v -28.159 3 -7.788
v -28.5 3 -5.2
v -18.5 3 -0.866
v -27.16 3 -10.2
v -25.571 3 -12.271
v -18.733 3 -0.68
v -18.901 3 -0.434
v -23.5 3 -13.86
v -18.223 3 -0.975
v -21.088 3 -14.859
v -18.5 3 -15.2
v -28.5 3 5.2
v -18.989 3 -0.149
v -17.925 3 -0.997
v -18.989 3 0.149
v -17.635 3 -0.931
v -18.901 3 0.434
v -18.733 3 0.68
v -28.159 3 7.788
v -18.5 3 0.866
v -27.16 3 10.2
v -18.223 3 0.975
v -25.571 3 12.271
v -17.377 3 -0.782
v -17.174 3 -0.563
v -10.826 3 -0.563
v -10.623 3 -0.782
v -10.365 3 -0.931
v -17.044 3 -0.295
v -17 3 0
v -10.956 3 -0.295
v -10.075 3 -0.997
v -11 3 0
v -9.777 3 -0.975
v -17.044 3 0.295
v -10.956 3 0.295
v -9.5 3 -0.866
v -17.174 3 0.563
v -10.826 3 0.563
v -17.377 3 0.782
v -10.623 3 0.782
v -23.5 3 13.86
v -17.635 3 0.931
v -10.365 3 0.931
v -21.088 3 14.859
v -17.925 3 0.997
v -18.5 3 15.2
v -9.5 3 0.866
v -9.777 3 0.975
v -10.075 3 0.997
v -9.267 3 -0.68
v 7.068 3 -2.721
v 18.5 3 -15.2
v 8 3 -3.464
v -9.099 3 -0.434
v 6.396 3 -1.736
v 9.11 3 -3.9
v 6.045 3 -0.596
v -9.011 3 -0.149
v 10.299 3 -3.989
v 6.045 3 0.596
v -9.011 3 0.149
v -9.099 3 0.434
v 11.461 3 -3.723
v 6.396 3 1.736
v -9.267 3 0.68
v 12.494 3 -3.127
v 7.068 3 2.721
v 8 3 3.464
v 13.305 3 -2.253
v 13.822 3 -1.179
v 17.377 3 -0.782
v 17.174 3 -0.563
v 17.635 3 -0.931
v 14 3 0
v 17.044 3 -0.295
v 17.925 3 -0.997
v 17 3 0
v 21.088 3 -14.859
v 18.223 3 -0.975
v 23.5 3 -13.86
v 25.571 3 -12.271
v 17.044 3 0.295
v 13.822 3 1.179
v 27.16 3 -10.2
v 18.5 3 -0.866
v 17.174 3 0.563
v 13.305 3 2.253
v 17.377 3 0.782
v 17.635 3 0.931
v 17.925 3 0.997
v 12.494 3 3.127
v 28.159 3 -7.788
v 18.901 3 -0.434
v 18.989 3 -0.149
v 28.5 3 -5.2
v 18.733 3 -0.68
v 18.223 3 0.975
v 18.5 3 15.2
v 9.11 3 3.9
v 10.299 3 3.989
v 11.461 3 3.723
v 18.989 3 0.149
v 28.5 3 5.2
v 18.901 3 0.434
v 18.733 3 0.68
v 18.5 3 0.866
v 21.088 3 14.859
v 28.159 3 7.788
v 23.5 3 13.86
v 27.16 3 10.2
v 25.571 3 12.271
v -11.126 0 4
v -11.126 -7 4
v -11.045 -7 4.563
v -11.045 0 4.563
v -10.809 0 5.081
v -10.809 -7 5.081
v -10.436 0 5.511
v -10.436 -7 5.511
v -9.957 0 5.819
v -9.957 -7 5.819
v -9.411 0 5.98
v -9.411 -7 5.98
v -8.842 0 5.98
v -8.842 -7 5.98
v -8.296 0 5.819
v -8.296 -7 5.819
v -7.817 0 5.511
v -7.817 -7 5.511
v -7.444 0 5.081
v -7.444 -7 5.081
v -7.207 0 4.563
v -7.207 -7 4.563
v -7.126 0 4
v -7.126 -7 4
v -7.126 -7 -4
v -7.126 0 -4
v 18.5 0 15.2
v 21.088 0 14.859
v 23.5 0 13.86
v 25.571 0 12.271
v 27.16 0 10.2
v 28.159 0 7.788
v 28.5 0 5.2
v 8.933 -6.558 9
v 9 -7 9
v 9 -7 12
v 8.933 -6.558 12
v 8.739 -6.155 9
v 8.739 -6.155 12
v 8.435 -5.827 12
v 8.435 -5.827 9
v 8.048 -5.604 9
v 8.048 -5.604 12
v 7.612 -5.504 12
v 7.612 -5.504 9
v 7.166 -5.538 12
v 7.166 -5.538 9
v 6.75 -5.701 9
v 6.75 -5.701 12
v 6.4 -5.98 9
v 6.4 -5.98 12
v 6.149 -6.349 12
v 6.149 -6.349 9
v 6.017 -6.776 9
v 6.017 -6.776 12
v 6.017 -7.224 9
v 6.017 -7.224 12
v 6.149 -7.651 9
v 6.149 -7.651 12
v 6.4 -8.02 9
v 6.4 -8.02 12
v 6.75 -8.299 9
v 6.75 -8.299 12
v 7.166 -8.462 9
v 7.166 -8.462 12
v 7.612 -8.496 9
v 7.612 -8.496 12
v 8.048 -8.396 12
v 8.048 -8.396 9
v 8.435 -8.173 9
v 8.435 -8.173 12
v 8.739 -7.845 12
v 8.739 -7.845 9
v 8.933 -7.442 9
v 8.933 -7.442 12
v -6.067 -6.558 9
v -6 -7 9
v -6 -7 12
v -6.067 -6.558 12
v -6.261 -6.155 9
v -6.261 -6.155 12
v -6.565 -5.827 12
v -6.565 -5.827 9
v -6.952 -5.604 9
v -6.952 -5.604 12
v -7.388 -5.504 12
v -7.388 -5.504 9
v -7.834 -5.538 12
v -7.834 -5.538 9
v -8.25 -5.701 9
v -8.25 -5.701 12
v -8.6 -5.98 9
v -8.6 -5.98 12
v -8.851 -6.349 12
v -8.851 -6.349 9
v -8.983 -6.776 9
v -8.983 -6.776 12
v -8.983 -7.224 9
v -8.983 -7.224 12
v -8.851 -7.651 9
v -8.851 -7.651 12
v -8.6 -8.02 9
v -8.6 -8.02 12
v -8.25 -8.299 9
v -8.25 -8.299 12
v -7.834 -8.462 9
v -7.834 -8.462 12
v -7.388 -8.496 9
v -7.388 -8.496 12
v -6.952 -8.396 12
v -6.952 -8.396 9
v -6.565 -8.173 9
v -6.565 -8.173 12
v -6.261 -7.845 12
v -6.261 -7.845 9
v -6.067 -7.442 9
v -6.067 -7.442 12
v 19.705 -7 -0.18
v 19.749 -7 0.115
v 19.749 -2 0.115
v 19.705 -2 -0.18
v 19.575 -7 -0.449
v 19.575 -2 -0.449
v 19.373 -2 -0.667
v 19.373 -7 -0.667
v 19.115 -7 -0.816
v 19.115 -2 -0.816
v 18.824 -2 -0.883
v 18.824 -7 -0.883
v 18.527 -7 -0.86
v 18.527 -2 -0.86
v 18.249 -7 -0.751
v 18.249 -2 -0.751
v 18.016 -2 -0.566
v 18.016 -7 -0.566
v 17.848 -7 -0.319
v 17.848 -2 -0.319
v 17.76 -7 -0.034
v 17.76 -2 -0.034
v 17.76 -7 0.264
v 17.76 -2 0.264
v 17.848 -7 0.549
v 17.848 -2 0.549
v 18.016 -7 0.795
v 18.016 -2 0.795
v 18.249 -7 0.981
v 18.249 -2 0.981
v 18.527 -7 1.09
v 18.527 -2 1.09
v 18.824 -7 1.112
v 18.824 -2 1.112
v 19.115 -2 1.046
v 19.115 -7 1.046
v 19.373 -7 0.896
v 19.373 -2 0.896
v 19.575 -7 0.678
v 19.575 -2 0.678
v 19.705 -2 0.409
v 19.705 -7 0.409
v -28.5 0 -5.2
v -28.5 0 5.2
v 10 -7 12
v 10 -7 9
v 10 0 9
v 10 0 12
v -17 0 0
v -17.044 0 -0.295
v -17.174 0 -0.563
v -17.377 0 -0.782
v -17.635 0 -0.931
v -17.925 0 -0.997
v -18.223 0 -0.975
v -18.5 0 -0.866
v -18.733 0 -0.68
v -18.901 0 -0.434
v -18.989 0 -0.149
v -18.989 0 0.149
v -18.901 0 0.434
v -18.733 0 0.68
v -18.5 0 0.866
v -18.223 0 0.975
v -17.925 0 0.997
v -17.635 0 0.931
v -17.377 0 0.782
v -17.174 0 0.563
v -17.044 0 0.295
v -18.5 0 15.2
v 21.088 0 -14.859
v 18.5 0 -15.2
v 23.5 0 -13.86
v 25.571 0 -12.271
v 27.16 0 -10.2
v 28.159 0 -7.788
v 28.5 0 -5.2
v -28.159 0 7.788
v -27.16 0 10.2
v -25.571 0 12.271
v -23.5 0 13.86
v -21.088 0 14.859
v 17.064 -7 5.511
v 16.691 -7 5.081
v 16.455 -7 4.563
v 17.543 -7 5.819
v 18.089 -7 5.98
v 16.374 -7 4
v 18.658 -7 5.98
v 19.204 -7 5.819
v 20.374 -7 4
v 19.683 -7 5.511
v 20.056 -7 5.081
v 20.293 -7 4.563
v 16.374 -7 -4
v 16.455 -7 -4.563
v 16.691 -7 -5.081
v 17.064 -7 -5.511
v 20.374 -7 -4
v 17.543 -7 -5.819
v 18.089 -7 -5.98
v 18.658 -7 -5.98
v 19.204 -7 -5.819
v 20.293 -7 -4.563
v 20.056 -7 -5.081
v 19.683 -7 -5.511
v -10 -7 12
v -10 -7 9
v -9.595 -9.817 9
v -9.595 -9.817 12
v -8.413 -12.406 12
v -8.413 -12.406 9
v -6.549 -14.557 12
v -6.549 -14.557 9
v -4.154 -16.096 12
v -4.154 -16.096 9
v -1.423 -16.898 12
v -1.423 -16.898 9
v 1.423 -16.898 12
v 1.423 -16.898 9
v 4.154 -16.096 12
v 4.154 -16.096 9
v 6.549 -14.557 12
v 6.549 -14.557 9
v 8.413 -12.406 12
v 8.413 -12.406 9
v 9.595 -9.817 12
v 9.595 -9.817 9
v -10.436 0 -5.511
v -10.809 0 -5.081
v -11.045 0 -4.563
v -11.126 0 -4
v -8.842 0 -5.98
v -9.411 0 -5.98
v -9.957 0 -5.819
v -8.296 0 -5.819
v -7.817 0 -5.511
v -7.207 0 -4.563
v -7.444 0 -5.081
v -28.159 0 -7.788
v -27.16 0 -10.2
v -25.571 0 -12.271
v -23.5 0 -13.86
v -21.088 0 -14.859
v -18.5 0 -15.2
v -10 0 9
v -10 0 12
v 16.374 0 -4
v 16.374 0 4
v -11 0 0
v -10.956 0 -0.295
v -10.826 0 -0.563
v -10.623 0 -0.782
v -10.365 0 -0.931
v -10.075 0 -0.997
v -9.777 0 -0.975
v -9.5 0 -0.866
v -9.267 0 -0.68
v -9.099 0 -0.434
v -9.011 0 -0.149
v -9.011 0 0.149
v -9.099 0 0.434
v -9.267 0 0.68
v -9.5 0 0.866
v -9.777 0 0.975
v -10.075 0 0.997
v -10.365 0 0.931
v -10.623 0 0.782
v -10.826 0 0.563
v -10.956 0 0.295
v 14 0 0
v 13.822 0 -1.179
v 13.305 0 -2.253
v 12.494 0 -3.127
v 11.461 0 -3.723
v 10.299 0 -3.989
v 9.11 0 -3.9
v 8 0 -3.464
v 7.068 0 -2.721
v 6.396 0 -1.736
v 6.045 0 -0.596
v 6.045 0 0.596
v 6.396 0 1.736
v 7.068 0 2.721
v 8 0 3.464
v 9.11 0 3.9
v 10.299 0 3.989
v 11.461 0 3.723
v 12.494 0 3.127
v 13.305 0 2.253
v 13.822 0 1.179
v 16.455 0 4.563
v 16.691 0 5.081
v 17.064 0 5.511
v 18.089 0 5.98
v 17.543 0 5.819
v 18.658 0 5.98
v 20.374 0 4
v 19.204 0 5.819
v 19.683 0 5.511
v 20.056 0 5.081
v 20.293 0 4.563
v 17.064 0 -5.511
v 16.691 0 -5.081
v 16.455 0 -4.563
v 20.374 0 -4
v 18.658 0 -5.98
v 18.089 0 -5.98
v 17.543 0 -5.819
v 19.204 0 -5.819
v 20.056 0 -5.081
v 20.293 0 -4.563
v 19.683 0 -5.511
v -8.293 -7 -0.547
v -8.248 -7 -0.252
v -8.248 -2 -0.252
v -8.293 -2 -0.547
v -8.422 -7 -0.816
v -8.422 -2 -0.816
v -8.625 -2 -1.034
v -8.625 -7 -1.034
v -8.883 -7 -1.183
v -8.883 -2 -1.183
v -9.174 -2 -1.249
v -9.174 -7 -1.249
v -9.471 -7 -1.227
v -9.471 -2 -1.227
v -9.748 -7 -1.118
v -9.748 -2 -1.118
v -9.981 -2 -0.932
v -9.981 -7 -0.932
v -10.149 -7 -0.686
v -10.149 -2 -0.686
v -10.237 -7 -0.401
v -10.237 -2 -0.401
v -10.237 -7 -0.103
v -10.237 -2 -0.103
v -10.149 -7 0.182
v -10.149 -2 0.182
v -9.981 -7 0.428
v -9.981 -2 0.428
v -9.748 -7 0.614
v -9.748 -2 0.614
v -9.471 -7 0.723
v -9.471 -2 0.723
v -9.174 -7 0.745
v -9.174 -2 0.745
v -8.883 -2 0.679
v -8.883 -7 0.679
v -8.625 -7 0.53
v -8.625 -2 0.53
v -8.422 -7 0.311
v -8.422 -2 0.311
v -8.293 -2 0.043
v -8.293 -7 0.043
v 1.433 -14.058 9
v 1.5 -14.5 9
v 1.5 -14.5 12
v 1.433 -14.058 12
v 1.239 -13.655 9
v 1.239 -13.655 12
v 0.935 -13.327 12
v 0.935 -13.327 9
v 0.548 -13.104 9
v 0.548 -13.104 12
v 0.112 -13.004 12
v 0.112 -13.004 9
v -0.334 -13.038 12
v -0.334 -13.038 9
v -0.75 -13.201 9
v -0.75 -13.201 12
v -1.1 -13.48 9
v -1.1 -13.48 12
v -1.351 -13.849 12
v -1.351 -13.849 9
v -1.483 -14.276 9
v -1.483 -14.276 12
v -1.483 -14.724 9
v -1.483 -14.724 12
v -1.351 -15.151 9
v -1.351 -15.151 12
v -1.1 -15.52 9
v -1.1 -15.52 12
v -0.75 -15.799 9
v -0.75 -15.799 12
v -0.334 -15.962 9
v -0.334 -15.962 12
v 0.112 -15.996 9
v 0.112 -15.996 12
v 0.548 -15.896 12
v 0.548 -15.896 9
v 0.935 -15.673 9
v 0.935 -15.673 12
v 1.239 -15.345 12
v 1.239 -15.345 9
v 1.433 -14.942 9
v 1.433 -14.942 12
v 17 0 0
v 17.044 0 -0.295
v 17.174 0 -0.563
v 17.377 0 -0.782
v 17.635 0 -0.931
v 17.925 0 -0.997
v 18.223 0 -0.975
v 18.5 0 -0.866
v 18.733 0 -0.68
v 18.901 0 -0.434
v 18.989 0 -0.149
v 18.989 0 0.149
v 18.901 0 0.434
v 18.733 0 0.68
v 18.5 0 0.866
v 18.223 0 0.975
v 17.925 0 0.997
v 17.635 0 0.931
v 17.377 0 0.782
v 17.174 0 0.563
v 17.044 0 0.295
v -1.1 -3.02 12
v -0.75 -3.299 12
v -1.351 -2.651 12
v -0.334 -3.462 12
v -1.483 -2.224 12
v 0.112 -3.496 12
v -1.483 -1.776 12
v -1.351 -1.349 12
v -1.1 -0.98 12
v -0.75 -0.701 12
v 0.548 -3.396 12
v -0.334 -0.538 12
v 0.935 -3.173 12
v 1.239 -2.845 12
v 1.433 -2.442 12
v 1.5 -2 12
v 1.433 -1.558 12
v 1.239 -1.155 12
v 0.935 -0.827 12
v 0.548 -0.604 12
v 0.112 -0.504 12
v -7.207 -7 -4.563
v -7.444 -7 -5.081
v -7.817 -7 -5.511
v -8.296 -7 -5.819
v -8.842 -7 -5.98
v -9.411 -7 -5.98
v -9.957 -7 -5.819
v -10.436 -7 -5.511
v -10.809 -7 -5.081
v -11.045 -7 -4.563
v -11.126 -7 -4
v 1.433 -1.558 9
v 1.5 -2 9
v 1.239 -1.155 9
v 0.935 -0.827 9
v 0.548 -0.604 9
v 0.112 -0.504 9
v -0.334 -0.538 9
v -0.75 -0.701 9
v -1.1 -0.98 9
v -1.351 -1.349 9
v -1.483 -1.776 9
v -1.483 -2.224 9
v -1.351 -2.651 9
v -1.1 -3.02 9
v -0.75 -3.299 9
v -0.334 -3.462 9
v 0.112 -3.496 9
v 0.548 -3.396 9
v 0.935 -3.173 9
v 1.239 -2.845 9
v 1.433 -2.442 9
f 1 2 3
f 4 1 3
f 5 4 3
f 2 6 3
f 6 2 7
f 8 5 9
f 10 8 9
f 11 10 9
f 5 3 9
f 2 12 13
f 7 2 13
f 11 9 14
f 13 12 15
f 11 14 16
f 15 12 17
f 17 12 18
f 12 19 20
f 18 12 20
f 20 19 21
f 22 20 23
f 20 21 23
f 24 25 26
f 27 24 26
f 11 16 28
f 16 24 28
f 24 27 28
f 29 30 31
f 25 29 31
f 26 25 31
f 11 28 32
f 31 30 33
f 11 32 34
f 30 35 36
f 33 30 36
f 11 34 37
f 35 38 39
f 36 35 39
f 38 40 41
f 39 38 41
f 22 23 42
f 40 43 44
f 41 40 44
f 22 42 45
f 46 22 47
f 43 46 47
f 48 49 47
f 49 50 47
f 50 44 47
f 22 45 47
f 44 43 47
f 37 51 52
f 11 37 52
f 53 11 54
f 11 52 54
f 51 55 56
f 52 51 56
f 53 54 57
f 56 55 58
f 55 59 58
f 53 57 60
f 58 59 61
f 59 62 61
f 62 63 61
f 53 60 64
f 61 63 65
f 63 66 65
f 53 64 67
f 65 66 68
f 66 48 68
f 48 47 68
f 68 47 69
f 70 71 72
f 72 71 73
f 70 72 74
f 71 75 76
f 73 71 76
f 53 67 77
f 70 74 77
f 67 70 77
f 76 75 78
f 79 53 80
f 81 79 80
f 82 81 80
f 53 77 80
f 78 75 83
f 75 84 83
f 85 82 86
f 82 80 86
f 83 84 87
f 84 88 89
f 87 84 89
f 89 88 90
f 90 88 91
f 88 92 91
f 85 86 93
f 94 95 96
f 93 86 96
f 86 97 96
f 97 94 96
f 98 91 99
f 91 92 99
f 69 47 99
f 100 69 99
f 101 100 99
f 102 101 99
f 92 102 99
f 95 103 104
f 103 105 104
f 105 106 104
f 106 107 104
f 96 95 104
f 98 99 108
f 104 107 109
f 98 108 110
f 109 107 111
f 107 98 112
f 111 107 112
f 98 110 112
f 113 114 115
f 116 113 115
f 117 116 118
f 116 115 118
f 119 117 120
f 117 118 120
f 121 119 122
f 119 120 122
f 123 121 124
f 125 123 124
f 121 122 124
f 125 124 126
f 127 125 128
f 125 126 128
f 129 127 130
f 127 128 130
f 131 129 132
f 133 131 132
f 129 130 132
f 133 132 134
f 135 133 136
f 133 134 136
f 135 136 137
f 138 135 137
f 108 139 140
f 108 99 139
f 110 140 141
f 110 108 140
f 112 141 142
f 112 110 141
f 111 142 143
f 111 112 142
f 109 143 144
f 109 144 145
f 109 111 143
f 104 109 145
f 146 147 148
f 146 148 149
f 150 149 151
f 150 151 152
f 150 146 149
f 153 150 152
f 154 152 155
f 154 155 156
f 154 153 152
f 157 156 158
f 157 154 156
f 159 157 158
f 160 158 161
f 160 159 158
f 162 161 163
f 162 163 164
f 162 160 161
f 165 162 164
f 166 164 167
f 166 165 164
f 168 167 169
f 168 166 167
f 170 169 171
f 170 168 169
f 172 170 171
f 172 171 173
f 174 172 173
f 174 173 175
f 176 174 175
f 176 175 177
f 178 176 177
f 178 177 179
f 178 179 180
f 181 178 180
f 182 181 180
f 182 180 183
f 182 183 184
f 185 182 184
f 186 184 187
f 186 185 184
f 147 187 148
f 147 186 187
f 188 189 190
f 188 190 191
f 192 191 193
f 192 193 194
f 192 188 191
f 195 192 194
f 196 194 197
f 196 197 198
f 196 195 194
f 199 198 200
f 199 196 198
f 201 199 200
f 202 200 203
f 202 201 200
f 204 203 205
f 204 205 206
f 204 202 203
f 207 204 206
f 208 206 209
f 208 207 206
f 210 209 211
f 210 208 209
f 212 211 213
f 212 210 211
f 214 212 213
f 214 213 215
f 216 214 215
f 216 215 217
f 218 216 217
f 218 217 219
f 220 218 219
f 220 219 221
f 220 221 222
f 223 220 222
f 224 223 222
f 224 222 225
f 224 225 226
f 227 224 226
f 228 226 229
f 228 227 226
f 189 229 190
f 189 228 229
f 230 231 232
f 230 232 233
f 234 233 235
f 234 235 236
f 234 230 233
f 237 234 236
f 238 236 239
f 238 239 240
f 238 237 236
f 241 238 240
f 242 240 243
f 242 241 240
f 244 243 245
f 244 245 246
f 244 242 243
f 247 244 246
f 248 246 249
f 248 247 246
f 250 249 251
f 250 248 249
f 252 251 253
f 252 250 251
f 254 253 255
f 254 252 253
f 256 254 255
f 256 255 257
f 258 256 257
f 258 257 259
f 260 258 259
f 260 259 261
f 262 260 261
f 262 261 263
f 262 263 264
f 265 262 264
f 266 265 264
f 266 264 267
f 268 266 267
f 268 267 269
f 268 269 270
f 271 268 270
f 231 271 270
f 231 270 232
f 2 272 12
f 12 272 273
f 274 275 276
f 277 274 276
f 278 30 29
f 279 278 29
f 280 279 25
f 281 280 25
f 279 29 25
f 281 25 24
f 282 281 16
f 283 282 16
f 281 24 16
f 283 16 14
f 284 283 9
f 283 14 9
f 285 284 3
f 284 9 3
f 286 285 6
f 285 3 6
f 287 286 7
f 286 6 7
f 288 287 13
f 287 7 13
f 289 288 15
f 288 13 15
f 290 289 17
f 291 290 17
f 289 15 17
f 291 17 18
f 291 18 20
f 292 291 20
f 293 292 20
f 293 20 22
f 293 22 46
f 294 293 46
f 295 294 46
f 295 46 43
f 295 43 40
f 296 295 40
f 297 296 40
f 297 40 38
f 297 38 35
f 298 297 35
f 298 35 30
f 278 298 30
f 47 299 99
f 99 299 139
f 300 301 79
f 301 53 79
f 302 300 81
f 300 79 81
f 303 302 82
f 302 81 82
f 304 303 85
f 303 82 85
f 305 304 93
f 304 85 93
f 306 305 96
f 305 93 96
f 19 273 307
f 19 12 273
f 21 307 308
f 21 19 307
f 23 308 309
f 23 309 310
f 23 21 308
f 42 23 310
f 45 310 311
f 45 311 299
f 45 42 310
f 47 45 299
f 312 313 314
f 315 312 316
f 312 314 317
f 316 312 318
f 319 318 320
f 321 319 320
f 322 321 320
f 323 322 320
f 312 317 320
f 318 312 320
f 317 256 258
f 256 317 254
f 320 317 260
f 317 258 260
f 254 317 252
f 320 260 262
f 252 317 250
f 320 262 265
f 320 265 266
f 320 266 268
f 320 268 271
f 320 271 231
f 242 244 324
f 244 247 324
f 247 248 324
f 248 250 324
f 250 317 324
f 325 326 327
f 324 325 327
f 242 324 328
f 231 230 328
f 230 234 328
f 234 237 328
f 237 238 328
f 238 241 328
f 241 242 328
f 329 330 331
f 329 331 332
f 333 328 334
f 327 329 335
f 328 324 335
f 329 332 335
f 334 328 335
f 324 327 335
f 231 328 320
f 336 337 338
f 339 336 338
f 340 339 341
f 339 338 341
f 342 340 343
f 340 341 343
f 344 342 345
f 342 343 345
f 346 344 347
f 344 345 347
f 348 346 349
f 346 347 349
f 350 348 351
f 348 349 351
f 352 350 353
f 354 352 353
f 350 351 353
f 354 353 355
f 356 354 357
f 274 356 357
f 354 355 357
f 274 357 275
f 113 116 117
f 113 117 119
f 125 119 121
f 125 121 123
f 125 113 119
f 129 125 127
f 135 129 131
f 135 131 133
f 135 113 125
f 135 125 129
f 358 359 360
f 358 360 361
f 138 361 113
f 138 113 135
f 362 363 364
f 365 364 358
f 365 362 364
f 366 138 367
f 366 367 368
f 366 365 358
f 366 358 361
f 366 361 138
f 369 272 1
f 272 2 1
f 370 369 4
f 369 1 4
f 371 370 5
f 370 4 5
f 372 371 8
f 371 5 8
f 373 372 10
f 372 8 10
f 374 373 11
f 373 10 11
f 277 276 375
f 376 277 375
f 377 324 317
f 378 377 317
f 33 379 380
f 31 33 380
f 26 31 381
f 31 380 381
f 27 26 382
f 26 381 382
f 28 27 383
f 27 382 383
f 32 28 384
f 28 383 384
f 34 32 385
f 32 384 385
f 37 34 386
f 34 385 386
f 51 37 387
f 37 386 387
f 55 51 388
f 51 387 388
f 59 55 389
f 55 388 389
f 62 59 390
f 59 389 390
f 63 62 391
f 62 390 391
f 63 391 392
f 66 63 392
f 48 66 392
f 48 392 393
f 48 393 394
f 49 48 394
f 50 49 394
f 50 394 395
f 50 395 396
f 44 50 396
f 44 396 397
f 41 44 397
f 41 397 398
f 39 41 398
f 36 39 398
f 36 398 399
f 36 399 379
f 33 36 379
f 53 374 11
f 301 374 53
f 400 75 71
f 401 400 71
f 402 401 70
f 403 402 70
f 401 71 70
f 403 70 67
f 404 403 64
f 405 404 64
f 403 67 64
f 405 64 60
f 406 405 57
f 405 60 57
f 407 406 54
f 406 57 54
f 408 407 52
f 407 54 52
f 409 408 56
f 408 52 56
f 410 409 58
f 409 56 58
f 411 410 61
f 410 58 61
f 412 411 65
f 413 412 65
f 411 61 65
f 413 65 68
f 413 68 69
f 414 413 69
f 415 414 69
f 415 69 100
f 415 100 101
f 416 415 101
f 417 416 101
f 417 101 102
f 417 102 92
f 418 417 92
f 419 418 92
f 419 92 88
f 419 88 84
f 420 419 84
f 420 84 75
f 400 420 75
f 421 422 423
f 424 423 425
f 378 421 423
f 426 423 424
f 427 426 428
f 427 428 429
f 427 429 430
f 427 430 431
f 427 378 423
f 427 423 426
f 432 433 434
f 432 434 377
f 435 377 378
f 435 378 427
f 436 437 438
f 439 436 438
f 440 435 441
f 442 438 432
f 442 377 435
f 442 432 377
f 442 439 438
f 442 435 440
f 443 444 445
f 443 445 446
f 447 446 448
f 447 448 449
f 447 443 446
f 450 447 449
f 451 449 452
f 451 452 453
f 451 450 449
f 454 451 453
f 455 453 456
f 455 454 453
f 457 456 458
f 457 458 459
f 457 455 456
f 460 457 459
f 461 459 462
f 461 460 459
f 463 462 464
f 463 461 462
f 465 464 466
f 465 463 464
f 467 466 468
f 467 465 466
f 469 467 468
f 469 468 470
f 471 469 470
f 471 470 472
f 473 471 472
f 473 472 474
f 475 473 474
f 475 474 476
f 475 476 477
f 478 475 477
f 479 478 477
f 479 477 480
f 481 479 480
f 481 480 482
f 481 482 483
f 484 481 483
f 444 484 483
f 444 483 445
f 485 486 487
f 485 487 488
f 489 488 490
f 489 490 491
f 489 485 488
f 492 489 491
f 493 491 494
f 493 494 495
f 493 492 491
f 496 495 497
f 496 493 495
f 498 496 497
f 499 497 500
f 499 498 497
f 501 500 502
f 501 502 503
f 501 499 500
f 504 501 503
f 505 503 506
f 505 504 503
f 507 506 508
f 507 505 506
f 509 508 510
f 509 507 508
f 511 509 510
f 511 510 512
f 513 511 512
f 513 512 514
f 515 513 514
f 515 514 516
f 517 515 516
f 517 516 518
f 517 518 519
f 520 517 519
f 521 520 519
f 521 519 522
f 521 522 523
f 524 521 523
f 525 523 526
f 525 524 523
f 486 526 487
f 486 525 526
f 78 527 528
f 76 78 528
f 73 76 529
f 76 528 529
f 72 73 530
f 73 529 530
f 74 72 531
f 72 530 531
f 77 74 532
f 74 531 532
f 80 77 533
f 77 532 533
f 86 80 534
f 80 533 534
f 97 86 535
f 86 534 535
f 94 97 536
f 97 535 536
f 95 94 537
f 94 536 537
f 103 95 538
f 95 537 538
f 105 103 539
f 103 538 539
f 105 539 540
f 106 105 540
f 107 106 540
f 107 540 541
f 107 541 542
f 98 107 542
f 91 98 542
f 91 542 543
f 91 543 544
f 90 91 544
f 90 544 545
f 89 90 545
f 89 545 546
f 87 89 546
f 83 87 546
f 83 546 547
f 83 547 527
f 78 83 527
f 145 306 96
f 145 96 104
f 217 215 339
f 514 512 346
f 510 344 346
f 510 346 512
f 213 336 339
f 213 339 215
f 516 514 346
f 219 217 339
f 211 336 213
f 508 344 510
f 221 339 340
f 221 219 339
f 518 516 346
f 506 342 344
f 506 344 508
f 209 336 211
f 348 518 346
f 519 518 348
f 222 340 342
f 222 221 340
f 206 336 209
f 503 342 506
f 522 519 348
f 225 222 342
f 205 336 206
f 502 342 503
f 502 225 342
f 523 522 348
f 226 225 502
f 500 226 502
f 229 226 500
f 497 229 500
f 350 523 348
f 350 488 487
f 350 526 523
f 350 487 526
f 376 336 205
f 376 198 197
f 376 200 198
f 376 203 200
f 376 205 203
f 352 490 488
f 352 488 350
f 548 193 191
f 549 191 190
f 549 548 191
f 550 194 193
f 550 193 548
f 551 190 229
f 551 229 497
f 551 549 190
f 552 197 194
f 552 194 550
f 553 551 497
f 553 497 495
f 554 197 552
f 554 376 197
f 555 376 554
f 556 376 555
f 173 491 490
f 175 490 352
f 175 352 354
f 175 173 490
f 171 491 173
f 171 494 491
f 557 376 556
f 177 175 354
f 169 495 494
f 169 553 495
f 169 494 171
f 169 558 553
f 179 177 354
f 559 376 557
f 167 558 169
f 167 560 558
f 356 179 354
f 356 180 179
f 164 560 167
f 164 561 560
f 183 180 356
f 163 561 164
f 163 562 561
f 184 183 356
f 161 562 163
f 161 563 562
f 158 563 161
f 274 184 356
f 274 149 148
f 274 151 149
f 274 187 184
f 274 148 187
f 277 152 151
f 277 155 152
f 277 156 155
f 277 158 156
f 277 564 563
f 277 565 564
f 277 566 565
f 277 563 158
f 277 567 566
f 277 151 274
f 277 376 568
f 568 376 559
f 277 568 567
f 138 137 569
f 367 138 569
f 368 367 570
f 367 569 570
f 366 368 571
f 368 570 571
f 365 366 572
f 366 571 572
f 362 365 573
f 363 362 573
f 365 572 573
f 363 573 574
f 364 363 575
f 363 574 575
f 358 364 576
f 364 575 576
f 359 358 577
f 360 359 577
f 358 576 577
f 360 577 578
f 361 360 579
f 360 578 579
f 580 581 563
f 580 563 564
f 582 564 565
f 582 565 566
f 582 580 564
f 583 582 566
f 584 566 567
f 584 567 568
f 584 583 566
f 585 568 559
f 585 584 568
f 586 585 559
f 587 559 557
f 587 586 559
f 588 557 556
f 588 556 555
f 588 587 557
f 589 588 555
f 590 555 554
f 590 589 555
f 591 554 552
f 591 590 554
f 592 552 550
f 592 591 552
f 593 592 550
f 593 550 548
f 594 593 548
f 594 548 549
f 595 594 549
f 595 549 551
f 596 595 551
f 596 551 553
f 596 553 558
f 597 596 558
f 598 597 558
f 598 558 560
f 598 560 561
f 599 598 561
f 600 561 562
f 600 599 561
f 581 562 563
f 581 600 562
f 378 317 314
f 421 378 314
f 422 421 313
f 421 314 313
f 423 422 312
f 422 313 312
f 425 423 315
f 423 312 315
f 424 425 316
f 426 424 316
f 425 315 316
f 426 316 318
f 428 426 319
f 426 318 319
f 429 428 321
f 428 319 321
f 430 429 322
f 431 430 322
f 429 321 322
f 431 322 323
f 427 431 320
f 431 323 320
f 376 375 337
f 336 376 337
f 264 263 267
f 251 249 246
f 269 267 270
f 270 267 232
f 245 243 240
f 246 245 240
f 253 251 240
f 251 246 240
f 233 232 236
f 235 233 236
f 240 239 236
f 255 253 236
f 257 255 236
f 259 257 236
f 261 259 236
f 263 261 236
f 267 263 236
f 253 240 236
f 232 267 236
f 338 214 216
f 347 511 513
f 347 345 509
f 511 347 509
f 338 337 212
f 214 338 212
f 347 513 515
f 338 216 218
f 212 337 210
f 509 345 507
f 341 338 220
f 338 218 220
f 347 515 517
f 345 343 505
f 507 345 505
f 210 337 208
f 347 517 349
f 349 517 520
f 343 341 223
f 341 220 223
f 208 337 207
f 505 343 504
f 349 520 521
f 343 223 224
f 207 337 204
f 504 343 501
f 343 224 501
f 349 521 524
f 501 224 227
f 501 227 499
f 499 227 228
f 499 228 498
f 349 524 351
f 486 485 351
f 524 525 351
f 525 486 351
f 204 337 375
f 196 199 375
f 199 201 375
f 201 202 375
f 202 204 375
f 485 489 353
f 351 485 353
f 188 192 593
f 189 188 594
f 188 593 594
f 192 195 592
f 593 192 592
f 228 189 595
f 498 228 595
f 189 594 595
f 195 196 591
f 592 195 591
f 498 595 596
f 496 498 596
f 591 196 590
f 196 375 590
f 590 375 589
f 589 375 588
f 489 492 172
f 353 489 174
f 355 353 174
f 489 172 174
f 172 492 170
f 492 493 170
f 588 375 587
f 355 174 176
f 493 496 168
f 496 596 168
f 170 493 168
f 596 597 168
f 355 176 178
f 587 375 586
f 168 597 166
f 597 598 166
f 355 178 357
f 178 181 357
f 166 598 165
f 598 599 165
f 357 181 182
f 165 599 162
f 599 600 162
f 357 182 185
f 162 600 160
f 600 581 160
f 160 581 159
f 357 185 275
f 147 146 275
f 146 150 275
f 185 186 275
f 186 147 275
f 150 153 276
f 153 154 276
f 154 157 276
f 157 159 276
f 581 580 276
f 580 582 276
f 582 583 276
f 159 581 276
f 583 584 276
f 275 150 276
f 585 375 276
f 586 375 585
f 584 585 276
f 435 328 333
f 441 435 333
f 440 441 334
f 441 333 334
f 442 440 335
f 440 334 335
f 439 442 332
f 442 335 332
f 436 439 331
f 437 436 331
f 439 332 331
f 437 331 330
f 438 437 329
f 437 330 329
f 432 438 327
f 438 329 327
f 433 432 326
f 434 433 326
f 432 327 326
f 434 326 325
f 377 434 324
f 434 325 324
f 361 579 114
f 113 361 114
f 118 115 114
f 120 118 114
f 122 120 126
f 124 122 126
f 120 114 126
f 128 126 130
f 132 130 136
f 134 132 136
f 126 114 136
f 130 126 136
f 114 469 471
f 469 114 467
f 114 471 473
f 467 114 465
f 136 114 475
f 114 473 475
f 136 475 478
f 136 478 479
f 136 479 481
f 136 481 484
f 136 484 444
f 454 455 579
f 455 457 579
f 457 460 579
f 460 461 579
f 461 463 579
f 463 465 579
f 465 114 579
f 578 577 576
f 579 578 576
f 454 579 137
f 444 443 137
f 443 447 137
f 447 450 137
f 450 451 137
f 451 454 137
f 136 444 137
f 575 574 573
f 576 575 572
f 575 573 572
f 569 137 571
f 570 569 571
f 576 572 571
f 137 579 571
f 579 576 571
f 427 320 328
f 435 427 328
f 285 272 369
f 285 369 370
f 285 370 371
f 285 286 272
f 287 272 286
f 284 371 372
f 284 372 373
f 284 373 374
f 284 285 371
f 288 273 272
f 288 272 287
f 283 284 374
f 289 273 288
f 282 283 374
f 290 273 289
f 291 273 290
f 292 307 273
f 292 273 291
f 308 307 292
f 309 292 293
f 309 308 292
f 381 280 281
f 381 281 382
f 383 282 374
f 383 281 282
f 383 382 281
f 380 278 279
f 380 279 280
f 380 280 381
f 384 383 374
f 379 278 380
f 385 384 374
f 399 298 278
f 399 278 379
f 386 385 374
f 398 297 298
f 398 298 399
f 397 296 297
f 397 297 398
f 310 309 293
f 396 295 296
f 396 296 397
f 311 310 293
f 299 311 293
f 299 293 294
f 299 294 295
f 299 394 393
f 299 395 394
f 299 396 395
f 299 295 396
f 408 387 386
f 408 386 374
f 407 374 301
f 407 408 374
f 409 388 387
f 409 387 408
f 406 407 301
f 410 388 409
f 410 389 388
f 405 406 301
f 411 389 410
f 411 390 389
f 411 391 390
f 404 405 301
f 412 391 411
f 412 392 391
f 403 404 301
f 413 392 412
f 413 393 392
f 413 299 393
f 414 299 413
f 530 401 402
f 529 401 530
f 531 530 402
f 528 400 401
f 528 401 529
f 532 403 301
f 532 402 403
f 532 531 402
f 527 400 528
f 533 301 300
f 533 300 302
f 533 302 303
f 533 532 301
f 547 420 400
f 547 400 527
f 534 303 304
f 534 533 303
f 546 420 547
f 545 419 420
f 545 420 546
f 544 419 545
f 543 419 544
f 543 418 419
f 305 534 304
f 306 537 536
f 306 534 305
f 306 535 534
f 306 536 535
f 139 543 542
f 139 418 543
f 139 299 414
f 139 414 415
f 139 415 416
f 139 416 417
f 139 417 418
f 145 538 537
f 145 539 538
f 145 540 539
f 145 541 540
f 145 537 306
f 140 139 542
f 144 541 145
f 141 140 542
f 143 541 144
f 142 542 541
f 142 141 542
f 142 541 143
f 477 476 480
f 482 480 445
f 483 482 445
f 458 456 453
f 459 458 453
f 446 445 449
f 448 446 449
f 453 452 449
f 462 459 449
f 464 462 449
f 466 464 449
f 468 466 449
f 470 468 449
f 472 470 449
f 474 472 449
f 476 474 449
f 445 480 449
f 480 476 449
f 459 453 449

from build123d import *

# Parameters (mm, degrees)
SKETCH1_W                    = 57
SKETCH1_H                    = 30.4
BOSS_EXTRUDE1_DEPTH          = 3
BOSS_EXTRUDE2_DEPTH          = 7
BOSS_EXTRUDE3_DEPTH          = 3
BOSS_EXTRUDE4_DEPTH          = 7
F_8_0_8_DIAMETER_HOLE1_D     = 8
F_2_0_2_DIAMETER_HOLE1_D     = 2
F_2_0_2_DIAMETER_HOLE2_D     = 2
F_2_0_2_DIAMETER_HOLE2_DEPTH = 3
F_3_0_3_DIAMETER_HOLE1_D     = 3
F_3_0_3_DIAMETER_HOLE1_DEPTH = 6.2
F_3_0_3_DIAMETER_HOLE2_D     = 3
F_3_0_3_DIAMETER_HOLE2_DEPTH = 30.4
F_2_0_2_DIAMETER_HOLE3_D     = 2
F_2_0_2_DIAMETER_HOLE3_DEPTH = 5
FILLET1_R                    = 10


with BuildPart() as part:
    # Sketch1 → Boss-Extrude1 (new body)
    with BuildSketch(Plane.XZ):
        Rectangle(SKETCH1_W, SKETCH1_H)
    extrude(amount=-BOSS_EXTRUDE1_DEPTH)

    # Sketch2 → Boss-Extrude2 (add)
    with BuildSketch(Plane.XZ):
        with BuildLine():
            Line((16.37363234, -4), (16.37363234, 4))
            ThreePointArc((16.37363234, 4), (18.37363234, 6), (20.37363234, 4))
            Line((20.37363234, 4), (20.37363234, -4))
            ThreePointArc((20.37363234, -4), (18.37363234, -6), (16.37363234, -4))
        make_face()
    extrude(amount=BOSS_EXTRUDE2_DEPTH)

    # Sketch3 → Boss-Extrude3 (add)
    with BuildSketch(Plane.XY.offset(12)):
        with BuildLine():
            Line((10, -7), (10, 0))
            Line((10, 0), (-10, 0))
            Line((-10, 0), (-10, -7))
            ThreePointArc((-10, -7), (0, -17), (10, -7))
        make_face()
    extrude(amount=-BOSS_EXTRUDE3_DEPTH)

    # Sketch4 → Boss-Extrude4 (add)
    with BuildSketch(Plane.XZ):
        with BuildLine():
            Line((-11.12636766, -4), (-11.12636766, 4))
            ThreePointArc((-11.12636766, 4), (-9.12636766, 6), (-7.12636766, 4))
            Line((-7.12636766, 4), (-7.12636766, -4))
            ThreePointArc((-7.12636766, -4), (-9.12636766, -6), (-11.12636766, -4))
        make_face()
    extrude(amount=BOSS_EXTRUDE4_DEPTH)

    # Ø8.0 (8) Diameter Hole1 (through all)
    with Locations(Plane(origin=(0, 0, 0), x_dir=(-1, 0, 0), z_dir=(0, -1, 0))):
        with Locations((-10, 0)):
            Hole(F_8_0_8_DIAMETER_HOLE1_D / 2)

    # Ø2.0 (2) Diameter Hole1 (through all)
    with Locations(Plane(origin=(0, 0, 0), x_dir=(-1, 0, 0), z_dir=(0, -1, 0))):
        with Locations((18, 0)):
            Hole(F_2_0_2_DIAMETER_HOLE1_D / 2)

    # Ø2.0 (2) Diameter Hole2
    with Locations(Plane(origin=(0, 3, 0), x_dir=(1, 0, 0), z_dir=(0, 1, 0))):
        with Locations((18, 0), (-10, 0)):
            Hole(F_2_0_2_DIAMETER_HOLE2_D / 2, depth=F_2_0_2_DIAMETER_HOLE2_DEPTH)

    # Ø3.0 (3) Diameter Hole1
    with Locations(Plane.XY.offset(15.2)):
        with Locations((-7.5, -7)):
            Hole(F_3_0_3_DIAMETER_HOLE1_D / 2, depth=F_3_0_3_DIAMETER_HOLE1_DEPTH)

    # Ø3.0 (3) Diameter Hole2
    with Locations(Plane.XY.offset(15.2)):
        with Locations((0, -2), (7.5, -7), (0, -14.5)):
            Hole(F_3_0_3_DIAMETER_HOLE2_D / 2, depth=F_3_0_3_DIAMETER_HOLE2_DEPTH)

    # Ø2.0 (2) Diameter Hole3
    with Locations(Plane(origin=(0, -7, 0), x_dir=(-1, 0, 0), z_dir=(0, -1, 0))):
        with Locations((-18.749249064, -0.114633429), (9.24834794, 0.252193543)):
            Hole(F_2_0_2_DIAMETER_HOLE3_D / 2, depth=F_2_0_2_DIAMETER_HOLE3_DEPTH)

    # Fillet1
    fillet1_edges = [part.edges().sort_by_distance(p)[0] for p in [
        (-28.5, 1.5, -15.2),
        (28.5, 1.5, -15.2),
        (-28.5, 1.5, 15.2),
        (28.5, 1.5, 15.2),
    ]]
    fillet(fillet1_edges, radius=FILLET1_R)


with BuildPart() as body_2:
    # Split1: the piece on the far side of the plane
    add(part.part)
    split(bisect_by=Plane(origin=(0, 0, 0), x_dir=(0, 0, -1), z_dir=(0, -1, 0)), keep=Keep.BOTTOM)


with BuildPart() as part_1:
    add(part.part)

    # Split1
    split(bisect_by=Plane(origin=(0, 0, 0), x_dir=(0, 0, -1), z_dir=(0, -1, 0)), keep=Keep.TOP)


solid = Compound([body_2.part, part_1.part])
